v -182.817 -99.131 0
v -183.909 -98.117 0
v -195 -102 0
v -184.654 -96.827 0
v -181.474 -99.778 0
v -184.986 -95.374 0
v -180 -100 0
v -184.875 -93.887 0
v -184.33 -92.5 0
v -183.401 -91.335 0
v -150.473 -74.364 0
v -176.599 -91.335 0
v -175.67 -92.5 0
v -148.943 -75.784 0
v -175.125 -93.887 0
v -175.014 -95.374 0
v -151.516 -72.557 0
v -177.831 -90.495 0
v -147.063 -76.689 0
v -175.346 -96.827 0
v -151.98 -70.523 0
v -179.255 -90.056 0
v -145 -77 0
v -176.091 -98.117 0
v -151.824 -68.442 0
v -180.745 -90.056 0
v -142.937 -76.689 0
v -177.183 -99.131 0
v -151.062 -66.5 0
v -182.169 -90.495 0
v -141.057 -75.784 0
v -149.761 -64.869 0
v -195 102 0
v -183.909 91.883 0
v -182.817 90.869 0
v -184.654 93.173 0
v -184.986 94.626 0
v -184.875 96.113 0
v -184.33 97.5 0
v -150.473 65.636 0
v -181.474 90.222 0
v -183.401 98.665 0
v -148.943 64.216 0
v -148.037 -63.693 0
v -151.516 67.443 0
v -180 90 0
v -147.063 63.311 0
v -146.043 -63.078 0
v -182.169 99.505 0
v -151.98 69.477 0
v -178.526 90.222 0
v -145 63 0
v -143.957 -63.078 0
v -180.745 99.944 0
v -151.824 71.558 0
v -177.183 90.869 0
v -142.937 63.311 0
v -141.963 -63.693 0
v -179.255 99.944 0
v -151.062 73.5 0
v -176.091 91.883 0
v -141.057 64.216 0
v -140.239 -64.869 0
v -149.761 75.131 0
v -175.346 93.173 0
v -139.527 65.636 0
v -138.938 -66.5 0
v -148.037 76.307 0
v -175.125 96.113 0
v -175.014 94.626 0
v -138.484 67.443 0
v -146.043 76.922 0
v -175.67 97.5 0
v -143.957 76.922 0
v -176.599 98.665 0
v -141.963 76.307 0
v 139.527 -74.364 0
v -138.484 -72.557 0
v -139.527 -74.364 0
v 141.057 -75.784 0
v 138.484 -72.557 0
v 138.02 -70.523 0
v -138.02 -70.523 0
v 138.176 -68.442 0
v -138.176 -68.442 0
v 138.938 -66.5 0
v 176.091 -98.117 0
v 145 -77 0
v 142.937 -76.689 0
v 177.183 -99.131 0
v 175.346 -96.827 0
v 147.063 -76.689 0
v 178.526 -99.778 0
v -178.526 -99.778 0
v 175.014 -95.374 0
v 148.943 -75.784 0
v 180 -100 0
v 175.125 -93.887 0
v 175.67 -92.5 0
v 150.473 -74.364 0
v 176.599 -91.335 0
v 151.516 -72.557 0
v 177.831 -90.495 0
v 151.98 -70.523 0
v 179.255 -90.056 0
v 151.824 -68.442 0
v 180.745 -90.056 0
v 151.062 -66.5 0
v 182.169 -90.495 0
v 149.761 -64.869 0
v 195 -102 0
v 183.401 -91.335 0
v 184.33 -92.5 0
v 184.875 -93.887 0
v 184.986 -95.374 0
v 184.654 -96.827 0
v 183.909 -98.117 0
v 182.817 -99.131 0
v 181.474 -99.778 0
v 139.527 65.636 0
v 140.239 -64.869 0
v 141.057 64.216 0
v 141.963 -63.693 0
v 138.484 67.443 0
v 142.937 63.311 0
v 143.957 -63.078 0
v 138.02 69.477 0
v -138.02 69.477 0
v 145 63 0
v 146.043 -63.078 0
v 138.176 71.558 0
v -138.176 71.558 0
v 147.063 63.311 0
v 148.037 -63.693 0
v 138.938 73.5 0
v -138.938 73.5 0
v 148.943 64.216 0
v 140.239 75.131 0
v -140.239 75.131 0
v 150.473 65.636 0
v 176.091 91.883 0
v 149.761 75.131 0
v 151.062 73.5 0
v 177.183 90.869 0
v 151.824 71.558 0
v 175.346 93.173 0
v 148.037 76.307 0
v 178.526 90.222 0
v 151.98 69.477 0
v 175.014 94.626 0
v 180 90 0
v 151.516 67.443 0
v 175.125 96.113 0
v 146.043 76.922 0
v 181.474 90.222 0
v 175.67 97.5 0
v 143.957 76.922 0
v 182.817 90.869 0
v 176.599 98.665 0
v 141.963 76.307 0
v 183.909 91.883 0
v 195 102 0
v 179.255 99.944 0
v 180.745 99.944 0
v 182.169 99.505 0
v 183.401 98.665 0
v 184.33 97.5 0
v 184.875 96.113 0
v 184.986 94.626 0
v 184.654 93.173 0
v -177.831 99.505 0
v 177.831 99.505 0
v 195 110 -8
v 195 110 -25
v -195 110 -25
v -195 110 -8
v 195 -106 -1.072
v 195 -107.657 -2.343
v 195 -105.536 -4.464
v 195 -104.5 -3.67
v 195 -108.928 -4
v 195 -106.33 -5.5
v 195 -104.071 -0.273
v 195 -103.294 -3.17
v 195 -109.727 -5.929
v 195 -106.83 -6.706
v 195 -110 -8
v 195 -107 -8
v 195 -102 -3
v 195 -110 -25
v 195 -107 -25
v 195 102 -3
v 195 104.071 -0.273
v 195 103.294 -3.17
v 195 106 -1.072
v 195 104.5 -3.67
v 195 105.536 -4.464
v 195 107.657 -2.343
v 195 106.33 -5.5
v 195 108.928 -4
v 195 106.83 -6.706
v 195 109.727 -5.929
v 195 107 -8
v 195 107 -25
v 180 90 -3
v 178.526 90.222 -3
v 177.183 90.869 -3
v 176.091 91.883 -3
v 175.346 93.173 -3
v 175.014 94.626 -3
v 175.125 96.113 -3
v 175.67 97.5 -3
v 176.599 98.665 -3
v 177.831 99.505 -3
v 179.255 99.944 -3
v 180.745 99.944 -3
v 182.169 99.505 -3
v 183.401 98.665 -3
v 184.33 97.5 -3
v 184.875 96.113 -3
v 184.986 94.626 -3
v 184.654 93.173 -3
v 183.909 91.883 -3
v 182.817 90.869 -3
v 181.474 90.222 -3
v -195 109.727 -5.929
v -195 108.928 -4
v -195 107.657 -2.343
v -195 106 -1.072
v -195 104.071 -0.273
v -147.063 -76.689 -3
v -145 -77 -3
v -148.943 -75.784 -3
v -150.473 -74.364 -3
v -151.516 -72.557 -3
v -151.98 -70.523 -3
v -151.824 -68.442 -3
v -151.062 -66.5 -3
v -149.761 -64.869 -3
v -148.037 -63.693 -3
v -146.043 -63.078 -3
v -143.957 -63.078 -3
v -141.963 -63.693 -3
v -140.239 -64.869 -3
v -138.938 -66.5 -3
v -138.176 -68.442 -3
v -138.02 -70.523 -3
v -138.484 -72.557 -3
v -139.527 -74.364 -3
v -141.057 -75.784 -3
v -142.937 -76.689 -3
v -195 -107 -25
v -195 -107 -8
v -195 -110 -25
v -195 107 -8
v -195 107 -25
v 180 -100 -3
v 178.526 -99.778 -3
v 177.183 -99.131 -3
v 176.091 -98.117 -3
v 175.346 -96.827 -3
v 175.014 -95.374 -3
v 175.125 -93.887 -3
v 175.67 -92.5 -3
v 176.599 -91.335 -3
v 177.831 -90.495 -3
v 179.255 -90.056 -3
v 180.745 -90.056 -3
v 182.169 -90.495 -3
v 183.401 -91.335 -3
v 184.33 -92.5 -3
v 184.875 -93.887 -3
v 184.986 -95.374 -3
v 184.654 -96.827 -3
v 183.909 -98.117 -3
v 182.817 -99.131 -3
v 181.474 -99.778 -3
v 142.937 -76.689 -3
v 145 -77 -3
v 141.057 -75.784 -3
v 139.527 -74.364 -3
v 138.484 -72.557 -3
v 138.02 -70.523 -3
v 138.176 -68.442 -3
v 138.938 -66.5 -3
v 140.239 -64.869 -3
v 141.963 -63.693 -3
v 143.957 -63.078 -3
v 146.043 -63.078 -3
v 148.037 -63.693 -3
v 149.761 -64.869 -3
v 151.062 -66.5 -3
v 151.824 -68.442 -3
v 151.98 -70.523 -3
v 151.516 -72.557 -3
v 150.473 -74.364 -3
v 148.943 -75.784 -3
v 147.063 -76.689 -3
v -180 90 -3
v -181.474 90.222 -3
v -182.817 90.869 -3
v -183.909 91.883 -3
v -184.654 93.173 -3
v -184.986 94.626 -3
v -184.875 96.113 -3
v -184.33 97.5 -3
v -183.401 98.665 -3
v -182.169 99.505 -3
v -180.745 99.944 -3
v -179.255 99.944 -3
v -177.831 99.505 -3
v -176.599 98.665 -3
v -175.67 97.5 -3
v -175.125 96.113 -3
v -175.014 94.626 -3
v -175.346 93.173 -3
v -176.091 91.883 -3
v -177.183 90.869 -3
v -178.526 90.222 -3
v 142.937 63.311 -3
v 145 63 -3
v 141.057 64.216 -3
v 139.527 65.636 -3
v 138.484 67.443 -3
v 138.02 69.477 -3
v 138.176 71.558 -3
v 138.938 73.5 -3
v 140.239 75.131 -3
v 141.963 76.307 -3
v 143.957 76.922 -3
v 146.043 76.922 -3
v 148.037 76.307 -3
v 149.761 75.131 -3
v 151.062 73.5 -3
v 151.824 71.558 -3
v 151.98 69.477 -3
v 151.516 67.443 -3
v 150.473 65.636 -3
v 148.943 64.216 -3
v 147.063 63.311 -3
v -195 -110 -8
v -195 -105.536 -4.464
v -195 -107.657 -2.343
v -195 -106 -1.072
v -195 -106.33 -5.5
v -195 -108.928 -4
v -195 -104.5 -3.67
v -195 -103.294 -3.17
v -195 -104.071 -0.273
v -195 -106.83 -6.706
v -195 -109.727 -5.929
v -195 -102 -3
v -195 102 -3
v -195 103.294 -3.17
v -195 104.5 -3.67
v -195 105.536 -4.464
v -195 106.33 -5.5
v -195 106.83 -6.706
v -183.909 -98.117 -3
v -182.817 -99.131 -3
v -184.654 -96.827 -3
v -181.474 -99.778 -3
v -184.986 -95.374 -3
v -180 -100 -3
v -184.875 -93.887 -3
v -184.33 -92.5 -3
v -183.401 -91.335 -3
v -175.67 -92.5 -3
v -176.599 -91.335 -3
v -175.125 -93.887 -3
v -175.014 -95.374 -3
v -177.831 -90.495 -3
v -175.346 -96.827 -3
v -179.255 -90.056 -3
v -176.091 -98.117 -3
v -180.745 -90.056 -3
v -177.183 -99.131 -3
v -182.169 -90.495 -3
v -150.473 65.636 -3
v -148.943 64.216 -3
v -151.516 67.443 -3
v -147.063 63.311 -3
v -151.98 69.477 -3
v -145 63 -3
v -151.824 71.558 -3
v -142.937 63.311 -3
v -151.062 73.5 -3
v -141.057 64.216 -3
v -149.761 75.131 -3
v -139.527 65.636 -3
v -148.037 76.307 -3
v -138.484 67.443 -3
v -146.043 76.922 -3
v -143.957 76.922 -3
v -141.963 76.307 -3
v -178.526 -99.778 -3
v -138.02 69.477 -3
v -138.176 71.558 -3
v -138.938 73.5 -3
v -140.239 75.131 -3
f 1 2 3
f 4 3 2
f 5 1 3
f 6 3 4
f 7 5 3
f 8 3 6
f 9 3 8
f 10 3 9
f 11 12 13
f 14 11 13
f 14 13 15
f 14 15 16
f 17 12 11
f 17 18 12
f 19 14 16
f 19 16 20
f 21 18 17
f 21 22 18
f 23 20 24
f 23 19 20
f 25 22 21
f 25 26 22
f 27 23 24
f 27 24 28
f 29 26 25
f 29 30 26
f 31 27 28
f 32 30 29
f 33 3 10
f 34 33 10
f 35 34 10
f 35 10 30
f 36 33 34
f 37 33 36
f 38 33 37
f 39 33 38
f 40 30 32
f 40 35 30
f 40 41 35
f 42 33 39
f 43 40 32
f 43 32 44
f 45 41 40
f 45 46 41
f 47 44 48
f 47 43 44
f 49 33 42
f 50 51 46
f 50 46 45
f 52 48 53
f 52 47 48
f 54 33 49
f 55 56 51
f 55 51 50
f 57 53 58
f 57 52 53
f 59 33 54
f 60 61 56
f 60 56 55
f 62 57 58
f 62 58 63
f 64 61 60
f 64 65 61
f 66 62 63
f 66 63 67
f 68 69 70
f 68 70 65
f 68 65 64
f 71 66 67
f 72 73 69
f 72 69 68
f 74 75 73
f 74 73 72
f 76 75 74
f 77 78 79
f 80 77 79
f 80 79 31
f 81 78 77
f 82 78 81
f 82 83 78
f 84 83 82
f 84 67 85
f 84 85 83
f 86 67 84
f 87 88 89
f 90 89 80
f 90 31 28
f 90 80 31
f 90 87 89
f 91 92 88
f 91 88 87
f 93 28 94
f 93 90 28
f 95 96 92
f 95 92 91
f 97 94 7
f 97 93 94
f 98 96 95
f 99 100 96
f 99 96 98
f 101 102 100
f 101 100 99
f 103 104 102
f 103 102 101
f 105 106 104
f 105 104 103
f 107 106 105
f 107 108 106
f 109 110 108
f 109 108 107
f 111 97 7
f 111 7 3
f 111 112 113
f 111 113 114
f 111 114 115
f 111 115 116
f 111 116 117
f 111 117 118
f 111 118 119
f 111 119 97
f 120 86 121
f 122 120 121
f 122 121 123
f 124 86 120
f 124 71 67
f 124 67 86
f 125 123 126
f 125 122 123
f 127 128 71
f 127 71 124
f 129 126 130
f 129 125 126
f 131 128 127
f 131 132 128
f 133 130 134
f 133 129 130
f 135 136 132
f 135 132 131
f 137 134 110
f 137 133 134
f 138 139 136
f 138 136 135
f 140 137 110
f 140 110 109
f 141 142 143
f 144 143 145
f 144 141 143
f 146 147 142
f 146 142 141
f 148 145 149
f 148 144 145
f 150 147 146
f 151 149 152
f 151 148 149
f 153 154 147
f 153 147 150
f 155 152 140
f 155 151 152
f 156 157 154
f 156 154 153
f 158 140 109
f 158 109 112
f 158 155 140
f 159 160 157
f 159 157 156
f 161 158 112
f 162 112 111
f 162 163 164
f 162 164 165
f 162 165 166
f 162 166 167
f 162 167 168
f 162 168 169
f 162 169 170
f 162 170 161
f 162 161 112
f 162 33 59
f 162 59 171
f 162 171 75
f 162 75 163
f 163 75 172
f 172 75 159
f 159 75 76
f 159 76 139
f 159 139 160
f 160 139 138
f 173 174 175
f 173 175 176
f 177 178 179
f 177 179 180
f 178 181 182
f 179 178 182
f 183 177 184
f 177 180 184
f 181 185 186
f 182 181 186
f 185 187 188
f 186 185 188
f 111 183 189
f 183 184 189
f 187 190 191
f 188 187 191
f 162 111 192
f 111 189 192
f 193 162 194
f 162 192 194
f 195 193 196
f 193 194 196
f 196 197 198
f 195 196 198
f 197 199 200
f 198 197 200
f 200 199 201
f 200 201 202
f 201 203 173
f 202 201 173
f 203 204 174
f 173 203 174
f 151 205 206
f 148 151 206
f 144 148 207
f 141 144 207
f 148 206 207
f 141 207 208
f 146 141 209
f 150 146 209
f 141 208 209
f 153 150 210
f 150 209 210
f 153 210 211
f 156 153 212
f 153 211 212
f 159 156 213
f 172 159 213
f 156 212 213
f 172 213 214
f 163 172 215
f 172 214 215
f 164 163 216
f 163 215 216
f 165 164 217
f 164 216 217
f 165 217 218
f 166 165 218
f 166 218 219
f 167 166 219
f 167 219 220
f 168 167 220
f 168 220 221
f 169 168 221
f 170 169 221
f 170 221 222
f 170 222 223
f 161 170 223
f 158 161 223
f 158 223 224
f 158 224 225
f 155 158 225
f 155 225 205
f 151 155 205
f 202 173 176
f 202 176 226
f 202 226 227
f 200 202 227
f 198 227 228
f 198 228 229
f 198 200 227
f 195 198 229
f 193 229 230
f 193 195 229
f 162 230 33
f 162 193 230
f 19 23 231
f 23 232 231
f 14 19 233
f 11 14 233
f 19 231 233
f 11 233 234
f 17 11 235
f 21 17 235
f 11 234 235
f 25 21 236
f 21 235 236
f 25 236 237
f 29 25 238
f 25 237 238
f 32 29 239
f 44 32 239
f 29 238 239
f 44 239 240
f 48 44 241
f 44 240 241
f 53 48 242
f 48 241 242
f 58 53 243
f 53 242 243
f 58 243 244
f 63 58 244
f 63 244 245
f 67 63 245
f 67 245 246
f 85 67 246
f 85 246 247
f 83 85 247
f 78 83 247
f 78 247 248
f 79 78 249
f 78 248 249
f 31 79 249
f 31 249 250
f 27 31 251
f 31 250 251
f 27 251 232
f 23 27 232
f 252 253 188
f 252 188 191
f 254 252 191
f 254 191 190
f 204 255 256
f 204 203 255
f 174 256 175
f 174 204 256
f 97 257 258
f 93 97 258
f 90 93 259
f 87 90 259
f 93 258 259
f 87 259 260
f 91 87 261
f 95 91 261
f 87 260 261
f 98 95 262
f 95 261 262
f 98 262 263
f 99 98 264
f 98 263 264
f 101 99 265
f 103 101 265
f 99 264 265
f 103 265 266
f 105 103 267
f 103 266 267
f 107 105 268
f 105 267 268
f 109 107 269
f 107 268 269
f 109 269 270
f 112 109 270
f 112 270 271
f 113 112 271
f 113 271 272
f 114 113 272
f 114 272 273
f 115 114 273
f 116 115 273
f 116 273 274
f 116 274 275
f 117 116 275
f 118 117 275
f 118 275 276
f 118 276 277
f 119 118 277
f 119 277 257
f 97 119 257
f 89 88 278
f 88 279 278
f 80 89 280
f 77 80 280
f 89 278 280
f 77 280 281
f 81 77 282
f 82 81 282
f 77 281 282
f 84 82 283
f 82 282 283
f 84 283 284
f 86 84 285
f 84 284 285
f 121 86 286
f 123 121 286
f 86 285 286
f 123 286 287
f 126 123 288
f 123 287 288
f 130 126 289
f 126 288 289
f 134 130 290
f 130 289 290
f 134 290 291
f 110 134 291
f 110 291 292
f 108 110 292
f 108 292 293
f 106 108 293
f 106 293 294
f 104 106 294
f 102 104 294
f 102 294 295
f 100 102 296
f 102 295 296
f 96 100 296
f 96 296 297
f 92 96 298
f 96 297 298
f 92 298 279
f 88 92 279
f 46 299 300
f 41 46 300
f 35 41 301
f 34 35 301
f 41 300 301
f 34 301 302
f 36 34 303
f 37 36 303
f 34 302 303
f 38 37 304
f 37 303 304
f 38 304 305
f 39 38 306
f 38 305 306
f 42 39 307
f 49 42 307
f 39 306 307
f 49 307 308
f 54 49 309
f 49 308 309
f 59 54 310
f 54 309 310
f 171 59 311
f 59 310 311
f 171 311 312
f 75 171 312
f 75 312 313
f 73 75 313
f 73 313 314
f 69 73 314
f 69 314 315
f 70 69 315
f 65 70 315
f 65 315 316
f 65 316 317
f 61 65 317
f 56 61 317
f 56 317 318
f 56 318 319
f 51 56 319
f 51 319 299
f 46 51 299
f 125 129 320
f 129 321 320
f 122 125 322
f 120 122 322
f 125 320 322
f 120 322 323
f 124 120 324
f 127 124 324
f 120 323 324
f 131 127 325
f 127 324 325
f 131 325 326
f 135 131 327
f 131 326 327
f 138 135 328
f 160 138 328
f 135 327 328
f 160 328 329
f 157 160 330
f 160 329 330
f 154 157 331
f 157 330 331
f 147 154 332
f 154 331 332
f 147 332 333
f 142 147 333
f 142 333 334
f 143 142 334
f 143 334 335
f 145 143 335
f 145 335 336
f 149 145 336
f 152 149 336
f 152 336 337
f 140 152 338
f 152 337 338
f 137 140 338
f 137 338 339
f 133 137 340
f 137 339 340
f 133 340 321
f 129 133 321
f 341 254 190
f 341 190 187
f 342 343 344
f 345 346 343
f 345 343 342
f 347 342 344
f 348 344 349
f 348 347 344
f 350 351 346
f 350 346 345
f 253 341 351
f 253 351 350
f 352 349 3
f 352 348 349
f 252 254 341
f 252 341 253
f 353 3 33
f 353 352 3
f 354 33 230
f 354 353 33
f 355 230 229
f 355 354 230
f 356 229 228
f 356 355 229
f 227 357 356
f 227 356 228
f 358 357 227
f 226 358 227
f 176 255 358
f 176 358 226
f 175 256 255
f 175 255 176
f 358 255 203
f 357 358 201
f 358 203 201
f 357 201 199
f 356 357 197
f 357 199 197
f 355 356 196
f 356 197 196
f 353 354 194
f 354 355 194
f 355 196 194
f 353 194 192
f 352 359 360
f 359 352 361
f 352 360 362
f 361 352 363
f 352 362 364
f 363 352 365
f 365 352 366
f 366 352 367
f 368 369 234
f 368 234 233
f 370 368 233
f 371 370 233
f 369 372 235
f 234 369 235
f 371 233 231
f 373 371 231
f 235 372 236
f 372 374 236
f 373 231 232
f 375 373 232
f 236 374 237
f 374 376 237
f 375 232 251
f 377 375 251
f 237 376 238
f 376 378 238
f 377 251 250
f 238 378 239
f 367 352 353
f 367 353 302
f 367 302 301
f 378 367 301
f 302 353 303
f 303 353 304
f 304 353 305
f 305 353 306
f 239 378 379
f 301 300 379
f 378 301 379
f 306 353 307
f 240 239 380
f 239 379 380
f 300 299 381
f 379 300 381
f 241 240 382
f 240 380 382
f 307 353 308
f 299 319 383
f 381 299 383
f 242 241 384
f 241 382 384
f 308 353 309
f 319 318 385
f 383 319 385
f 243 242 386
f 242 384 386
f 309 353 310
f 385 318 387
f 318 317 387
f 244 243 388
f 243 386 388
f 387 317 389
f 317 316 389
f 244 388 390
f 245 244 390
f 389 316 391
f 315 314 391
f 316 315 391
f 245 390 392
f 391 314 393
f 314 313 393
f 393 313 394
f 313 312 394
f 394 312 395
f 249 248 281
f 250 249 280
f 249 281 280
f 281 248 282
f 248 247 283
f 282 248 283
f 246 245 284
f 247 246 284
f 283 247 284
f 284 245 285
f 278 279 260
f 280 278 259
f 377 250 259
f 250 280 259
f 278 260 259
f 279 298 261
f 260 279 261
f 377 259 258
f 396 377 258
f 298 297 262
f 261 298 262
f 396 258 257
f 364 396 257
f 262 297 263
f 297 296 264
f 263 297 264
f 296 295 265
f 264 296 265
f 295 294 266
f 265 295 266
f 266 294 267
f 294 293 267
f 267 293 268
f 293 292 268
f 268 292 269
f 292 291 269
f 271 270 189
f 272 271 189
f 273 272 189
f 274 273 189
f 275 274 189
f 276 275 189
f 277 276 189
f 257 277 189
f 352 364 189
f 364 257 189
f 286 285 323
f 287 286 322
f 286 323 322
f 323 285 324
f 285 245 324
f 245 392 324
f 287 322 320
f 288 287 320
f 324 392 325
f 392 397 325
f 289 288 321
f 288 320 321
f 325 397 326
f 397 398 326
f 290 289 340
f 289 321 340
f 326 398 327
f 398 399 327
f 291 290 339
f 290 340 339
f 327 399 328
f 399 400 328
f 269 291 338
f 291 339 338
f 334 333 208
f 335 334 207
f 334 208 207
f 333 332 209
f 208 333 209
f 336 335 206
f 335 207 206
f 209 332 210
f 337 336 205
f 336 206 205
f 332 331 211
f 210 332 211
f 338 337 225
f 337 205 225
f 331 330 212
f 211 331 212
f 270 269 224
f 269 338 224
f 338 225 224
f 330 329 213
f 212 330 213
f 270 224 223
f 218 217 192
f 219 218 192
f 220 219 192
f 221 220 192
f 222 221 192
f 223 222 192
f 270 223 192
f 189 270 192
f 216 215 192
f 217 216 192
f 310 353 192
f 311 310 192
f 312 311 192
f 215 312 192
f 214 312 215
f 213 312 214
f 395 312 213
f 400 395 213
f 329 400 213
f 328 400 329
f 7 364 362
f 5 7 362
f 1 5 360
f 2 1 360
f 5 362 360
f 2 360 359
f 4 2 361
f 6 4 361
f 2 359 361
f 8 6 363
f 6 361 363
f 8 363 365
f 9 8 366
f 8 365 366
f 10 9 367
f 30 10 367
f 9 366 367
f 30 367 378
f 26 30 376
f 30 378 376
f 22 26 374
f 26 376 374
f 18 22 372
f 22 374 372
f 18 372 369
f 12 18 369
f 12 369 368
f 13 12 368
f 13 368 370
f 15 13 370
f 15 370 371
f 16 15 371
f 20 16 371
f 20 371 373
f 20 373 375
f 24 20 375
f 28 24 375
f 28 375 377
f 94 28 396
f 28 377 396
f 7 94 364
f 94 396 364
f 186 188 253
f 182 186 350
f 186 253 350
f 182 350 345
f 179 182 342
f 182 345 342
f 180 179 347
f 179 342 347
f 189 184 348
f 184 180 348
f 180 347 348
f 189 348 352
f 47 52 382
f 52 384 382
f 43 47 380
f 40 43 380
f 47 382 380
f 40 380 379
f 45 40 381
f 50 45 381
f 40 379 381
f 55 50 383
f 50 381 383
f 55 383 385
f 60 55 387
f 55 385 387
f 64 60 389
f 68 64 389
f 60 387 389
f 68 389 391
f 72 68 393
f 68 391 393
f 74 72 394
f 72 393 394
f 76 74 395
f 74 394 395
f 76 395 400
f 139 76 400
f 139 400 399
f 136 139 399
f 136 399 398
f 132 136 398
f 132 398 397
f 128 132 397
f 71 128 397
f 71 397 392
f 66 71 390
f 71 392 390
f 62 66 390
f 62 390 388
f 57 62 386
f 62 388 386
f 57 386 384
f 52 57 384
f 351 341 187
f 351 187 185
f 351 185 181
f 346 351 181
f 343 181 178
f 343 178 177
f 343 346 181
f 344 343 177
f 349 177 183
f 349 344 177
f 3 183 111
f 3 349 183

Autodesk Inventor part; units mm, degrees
ref_plane "YZ Plane" through (0, 0, 0) normal (1, 0, 0) x (0, 1, 0)
ref_plane "XZ Plane" through (0, 0, 0) normal (0, 1, 0) x (-1, 0, 0)
ref_plane "XY Plane" through (0, 0, 0) normal (0, 0, 1) x (1, 0, 0)
sketch "Sketch1" plane through (0, 0, 0) normal (0, 0, 1) x (1, 0, 0)
  line L0 (-195, 110) -> (195, 110)
  line L1 (195, 110) -> (195, -110)
  line L2 (195, -110) -> (-195, -110)
  line L3 (-195, -110) -> (-195, 110)
  line L4 (-195, 110) -> (195, -110) construction
  point P0 (0, 0)
  point P1 (0, 0)
  dimension "d0" = 390
  dimension "d1" = 220
extrude "Plate1" add sketch "Sketch1" against normal blind 3
sketch "Sketch2" plane through (0, 0, 0) normal (0, 0, 1) x (1, 0, 0)
  line L0 (-145, 70) -> (145, 70) construction
  line L1 (145, 70) -> (145, -70) construction
  line L2 (145, -70) -> (-145, -70) construction
  line L3 (-145, -70) -> (-145, 70) construction
  line L4 (195, -110) -> (195, 110) projected
  point P0 (0, 0)
  point P1 (-145, 0)
  point P2 (0, 70)
  dimension "d3" = 290
  dimension "d4" = 140
hole "Hole1" at (-145, 70, 0) at (145, 70, 0) at (-145, -70, 0) at (145, -70, 0) direction (0, 0, -1) diameter 14 end through all
sketch "Sketch3" plane through (0, 0, 0) normal (0, 0, 1) x (1, 0, 0)
  line L0 (-180, 95) -> (180, 95) construction
  line L1 (180, 95) -> (180, -95) construction
  line L2 (180, -95) -> (-180, -95) construction
  line L3 (-180, -95) -> (-180, 95) construction
  line L4 (-180, 95) -> (180, -95) construction
  point P0 (0, 0)
  point P1 (0, 0)
  dimension "d14" = 190
  dimension "d15" = 360
hole "Hole2" at (-180, 95, 0) at (180, 95, 0) at (180, -95, 0) at (-180, -95, 0) direction (0, 0, -1) diameter 10 end through all
sketch "Sketch4" plane through (-195, -107, 0) normal (0, -1, 0) x (1, 0, 0)
  line L0 (390, 0) -> (0, 0)
  line L1 (0, 0) -> (0, -25)
  line L2 (0, -25) -> (390, -25)
  line L3 (390, -25) -> (390, 0)
edge flange "Flange1" height 25 angle 90 thickness 3 bend radius 5 thickness toward (0, -1, 0) relief round relief width 3 relief depth 1.5 corner gap 5 corner form 0 edges at (0, -110, -3) (0, 110, -3) wall of the first edge with corners at (195, -107, 0) (-195, -107, 0) (-195, -107, -25) (195, -107, -25)
bend "Bend1"
corner "Corner1"
equation "\"d11\" = Thickness"
equation "\"d2\" = Thickness"
equation "\"d23\" = BendReliefWidth"
equation "\"d24\" = BendReliefDepth"
equation "\"d25\" = MinimumRemnant"
equation "\"d26\" = TransitionRadius"
equation "\"d29\" = BendRadius"
equation "\"d30\" = CornerReliefSize"
equation "\"d31\" = GapSize"
equation "\"d32\" = JacobiRadiusSize"
equation "\"BendReliefWidth\" = Thickness"
equation "\"BendReliefDepth\" = 0.5 * Thickness"
equation "\"CornerReliefSize\" = 4 * Thickness"
equation "\"MinimumRemnant\" = 2 * Thickness"
equation "\"TransitionRadius\" = BendRadius"
equation "\"JacobiRadiusSize\" = BendRadius"
equation "\"GapSize\" = Thickness"
equation "\"Thickness\" = 3"
equation "\"BendRadius\" = 5"
properties part number "AIRPUMP plate" material "Stainless Steel"
